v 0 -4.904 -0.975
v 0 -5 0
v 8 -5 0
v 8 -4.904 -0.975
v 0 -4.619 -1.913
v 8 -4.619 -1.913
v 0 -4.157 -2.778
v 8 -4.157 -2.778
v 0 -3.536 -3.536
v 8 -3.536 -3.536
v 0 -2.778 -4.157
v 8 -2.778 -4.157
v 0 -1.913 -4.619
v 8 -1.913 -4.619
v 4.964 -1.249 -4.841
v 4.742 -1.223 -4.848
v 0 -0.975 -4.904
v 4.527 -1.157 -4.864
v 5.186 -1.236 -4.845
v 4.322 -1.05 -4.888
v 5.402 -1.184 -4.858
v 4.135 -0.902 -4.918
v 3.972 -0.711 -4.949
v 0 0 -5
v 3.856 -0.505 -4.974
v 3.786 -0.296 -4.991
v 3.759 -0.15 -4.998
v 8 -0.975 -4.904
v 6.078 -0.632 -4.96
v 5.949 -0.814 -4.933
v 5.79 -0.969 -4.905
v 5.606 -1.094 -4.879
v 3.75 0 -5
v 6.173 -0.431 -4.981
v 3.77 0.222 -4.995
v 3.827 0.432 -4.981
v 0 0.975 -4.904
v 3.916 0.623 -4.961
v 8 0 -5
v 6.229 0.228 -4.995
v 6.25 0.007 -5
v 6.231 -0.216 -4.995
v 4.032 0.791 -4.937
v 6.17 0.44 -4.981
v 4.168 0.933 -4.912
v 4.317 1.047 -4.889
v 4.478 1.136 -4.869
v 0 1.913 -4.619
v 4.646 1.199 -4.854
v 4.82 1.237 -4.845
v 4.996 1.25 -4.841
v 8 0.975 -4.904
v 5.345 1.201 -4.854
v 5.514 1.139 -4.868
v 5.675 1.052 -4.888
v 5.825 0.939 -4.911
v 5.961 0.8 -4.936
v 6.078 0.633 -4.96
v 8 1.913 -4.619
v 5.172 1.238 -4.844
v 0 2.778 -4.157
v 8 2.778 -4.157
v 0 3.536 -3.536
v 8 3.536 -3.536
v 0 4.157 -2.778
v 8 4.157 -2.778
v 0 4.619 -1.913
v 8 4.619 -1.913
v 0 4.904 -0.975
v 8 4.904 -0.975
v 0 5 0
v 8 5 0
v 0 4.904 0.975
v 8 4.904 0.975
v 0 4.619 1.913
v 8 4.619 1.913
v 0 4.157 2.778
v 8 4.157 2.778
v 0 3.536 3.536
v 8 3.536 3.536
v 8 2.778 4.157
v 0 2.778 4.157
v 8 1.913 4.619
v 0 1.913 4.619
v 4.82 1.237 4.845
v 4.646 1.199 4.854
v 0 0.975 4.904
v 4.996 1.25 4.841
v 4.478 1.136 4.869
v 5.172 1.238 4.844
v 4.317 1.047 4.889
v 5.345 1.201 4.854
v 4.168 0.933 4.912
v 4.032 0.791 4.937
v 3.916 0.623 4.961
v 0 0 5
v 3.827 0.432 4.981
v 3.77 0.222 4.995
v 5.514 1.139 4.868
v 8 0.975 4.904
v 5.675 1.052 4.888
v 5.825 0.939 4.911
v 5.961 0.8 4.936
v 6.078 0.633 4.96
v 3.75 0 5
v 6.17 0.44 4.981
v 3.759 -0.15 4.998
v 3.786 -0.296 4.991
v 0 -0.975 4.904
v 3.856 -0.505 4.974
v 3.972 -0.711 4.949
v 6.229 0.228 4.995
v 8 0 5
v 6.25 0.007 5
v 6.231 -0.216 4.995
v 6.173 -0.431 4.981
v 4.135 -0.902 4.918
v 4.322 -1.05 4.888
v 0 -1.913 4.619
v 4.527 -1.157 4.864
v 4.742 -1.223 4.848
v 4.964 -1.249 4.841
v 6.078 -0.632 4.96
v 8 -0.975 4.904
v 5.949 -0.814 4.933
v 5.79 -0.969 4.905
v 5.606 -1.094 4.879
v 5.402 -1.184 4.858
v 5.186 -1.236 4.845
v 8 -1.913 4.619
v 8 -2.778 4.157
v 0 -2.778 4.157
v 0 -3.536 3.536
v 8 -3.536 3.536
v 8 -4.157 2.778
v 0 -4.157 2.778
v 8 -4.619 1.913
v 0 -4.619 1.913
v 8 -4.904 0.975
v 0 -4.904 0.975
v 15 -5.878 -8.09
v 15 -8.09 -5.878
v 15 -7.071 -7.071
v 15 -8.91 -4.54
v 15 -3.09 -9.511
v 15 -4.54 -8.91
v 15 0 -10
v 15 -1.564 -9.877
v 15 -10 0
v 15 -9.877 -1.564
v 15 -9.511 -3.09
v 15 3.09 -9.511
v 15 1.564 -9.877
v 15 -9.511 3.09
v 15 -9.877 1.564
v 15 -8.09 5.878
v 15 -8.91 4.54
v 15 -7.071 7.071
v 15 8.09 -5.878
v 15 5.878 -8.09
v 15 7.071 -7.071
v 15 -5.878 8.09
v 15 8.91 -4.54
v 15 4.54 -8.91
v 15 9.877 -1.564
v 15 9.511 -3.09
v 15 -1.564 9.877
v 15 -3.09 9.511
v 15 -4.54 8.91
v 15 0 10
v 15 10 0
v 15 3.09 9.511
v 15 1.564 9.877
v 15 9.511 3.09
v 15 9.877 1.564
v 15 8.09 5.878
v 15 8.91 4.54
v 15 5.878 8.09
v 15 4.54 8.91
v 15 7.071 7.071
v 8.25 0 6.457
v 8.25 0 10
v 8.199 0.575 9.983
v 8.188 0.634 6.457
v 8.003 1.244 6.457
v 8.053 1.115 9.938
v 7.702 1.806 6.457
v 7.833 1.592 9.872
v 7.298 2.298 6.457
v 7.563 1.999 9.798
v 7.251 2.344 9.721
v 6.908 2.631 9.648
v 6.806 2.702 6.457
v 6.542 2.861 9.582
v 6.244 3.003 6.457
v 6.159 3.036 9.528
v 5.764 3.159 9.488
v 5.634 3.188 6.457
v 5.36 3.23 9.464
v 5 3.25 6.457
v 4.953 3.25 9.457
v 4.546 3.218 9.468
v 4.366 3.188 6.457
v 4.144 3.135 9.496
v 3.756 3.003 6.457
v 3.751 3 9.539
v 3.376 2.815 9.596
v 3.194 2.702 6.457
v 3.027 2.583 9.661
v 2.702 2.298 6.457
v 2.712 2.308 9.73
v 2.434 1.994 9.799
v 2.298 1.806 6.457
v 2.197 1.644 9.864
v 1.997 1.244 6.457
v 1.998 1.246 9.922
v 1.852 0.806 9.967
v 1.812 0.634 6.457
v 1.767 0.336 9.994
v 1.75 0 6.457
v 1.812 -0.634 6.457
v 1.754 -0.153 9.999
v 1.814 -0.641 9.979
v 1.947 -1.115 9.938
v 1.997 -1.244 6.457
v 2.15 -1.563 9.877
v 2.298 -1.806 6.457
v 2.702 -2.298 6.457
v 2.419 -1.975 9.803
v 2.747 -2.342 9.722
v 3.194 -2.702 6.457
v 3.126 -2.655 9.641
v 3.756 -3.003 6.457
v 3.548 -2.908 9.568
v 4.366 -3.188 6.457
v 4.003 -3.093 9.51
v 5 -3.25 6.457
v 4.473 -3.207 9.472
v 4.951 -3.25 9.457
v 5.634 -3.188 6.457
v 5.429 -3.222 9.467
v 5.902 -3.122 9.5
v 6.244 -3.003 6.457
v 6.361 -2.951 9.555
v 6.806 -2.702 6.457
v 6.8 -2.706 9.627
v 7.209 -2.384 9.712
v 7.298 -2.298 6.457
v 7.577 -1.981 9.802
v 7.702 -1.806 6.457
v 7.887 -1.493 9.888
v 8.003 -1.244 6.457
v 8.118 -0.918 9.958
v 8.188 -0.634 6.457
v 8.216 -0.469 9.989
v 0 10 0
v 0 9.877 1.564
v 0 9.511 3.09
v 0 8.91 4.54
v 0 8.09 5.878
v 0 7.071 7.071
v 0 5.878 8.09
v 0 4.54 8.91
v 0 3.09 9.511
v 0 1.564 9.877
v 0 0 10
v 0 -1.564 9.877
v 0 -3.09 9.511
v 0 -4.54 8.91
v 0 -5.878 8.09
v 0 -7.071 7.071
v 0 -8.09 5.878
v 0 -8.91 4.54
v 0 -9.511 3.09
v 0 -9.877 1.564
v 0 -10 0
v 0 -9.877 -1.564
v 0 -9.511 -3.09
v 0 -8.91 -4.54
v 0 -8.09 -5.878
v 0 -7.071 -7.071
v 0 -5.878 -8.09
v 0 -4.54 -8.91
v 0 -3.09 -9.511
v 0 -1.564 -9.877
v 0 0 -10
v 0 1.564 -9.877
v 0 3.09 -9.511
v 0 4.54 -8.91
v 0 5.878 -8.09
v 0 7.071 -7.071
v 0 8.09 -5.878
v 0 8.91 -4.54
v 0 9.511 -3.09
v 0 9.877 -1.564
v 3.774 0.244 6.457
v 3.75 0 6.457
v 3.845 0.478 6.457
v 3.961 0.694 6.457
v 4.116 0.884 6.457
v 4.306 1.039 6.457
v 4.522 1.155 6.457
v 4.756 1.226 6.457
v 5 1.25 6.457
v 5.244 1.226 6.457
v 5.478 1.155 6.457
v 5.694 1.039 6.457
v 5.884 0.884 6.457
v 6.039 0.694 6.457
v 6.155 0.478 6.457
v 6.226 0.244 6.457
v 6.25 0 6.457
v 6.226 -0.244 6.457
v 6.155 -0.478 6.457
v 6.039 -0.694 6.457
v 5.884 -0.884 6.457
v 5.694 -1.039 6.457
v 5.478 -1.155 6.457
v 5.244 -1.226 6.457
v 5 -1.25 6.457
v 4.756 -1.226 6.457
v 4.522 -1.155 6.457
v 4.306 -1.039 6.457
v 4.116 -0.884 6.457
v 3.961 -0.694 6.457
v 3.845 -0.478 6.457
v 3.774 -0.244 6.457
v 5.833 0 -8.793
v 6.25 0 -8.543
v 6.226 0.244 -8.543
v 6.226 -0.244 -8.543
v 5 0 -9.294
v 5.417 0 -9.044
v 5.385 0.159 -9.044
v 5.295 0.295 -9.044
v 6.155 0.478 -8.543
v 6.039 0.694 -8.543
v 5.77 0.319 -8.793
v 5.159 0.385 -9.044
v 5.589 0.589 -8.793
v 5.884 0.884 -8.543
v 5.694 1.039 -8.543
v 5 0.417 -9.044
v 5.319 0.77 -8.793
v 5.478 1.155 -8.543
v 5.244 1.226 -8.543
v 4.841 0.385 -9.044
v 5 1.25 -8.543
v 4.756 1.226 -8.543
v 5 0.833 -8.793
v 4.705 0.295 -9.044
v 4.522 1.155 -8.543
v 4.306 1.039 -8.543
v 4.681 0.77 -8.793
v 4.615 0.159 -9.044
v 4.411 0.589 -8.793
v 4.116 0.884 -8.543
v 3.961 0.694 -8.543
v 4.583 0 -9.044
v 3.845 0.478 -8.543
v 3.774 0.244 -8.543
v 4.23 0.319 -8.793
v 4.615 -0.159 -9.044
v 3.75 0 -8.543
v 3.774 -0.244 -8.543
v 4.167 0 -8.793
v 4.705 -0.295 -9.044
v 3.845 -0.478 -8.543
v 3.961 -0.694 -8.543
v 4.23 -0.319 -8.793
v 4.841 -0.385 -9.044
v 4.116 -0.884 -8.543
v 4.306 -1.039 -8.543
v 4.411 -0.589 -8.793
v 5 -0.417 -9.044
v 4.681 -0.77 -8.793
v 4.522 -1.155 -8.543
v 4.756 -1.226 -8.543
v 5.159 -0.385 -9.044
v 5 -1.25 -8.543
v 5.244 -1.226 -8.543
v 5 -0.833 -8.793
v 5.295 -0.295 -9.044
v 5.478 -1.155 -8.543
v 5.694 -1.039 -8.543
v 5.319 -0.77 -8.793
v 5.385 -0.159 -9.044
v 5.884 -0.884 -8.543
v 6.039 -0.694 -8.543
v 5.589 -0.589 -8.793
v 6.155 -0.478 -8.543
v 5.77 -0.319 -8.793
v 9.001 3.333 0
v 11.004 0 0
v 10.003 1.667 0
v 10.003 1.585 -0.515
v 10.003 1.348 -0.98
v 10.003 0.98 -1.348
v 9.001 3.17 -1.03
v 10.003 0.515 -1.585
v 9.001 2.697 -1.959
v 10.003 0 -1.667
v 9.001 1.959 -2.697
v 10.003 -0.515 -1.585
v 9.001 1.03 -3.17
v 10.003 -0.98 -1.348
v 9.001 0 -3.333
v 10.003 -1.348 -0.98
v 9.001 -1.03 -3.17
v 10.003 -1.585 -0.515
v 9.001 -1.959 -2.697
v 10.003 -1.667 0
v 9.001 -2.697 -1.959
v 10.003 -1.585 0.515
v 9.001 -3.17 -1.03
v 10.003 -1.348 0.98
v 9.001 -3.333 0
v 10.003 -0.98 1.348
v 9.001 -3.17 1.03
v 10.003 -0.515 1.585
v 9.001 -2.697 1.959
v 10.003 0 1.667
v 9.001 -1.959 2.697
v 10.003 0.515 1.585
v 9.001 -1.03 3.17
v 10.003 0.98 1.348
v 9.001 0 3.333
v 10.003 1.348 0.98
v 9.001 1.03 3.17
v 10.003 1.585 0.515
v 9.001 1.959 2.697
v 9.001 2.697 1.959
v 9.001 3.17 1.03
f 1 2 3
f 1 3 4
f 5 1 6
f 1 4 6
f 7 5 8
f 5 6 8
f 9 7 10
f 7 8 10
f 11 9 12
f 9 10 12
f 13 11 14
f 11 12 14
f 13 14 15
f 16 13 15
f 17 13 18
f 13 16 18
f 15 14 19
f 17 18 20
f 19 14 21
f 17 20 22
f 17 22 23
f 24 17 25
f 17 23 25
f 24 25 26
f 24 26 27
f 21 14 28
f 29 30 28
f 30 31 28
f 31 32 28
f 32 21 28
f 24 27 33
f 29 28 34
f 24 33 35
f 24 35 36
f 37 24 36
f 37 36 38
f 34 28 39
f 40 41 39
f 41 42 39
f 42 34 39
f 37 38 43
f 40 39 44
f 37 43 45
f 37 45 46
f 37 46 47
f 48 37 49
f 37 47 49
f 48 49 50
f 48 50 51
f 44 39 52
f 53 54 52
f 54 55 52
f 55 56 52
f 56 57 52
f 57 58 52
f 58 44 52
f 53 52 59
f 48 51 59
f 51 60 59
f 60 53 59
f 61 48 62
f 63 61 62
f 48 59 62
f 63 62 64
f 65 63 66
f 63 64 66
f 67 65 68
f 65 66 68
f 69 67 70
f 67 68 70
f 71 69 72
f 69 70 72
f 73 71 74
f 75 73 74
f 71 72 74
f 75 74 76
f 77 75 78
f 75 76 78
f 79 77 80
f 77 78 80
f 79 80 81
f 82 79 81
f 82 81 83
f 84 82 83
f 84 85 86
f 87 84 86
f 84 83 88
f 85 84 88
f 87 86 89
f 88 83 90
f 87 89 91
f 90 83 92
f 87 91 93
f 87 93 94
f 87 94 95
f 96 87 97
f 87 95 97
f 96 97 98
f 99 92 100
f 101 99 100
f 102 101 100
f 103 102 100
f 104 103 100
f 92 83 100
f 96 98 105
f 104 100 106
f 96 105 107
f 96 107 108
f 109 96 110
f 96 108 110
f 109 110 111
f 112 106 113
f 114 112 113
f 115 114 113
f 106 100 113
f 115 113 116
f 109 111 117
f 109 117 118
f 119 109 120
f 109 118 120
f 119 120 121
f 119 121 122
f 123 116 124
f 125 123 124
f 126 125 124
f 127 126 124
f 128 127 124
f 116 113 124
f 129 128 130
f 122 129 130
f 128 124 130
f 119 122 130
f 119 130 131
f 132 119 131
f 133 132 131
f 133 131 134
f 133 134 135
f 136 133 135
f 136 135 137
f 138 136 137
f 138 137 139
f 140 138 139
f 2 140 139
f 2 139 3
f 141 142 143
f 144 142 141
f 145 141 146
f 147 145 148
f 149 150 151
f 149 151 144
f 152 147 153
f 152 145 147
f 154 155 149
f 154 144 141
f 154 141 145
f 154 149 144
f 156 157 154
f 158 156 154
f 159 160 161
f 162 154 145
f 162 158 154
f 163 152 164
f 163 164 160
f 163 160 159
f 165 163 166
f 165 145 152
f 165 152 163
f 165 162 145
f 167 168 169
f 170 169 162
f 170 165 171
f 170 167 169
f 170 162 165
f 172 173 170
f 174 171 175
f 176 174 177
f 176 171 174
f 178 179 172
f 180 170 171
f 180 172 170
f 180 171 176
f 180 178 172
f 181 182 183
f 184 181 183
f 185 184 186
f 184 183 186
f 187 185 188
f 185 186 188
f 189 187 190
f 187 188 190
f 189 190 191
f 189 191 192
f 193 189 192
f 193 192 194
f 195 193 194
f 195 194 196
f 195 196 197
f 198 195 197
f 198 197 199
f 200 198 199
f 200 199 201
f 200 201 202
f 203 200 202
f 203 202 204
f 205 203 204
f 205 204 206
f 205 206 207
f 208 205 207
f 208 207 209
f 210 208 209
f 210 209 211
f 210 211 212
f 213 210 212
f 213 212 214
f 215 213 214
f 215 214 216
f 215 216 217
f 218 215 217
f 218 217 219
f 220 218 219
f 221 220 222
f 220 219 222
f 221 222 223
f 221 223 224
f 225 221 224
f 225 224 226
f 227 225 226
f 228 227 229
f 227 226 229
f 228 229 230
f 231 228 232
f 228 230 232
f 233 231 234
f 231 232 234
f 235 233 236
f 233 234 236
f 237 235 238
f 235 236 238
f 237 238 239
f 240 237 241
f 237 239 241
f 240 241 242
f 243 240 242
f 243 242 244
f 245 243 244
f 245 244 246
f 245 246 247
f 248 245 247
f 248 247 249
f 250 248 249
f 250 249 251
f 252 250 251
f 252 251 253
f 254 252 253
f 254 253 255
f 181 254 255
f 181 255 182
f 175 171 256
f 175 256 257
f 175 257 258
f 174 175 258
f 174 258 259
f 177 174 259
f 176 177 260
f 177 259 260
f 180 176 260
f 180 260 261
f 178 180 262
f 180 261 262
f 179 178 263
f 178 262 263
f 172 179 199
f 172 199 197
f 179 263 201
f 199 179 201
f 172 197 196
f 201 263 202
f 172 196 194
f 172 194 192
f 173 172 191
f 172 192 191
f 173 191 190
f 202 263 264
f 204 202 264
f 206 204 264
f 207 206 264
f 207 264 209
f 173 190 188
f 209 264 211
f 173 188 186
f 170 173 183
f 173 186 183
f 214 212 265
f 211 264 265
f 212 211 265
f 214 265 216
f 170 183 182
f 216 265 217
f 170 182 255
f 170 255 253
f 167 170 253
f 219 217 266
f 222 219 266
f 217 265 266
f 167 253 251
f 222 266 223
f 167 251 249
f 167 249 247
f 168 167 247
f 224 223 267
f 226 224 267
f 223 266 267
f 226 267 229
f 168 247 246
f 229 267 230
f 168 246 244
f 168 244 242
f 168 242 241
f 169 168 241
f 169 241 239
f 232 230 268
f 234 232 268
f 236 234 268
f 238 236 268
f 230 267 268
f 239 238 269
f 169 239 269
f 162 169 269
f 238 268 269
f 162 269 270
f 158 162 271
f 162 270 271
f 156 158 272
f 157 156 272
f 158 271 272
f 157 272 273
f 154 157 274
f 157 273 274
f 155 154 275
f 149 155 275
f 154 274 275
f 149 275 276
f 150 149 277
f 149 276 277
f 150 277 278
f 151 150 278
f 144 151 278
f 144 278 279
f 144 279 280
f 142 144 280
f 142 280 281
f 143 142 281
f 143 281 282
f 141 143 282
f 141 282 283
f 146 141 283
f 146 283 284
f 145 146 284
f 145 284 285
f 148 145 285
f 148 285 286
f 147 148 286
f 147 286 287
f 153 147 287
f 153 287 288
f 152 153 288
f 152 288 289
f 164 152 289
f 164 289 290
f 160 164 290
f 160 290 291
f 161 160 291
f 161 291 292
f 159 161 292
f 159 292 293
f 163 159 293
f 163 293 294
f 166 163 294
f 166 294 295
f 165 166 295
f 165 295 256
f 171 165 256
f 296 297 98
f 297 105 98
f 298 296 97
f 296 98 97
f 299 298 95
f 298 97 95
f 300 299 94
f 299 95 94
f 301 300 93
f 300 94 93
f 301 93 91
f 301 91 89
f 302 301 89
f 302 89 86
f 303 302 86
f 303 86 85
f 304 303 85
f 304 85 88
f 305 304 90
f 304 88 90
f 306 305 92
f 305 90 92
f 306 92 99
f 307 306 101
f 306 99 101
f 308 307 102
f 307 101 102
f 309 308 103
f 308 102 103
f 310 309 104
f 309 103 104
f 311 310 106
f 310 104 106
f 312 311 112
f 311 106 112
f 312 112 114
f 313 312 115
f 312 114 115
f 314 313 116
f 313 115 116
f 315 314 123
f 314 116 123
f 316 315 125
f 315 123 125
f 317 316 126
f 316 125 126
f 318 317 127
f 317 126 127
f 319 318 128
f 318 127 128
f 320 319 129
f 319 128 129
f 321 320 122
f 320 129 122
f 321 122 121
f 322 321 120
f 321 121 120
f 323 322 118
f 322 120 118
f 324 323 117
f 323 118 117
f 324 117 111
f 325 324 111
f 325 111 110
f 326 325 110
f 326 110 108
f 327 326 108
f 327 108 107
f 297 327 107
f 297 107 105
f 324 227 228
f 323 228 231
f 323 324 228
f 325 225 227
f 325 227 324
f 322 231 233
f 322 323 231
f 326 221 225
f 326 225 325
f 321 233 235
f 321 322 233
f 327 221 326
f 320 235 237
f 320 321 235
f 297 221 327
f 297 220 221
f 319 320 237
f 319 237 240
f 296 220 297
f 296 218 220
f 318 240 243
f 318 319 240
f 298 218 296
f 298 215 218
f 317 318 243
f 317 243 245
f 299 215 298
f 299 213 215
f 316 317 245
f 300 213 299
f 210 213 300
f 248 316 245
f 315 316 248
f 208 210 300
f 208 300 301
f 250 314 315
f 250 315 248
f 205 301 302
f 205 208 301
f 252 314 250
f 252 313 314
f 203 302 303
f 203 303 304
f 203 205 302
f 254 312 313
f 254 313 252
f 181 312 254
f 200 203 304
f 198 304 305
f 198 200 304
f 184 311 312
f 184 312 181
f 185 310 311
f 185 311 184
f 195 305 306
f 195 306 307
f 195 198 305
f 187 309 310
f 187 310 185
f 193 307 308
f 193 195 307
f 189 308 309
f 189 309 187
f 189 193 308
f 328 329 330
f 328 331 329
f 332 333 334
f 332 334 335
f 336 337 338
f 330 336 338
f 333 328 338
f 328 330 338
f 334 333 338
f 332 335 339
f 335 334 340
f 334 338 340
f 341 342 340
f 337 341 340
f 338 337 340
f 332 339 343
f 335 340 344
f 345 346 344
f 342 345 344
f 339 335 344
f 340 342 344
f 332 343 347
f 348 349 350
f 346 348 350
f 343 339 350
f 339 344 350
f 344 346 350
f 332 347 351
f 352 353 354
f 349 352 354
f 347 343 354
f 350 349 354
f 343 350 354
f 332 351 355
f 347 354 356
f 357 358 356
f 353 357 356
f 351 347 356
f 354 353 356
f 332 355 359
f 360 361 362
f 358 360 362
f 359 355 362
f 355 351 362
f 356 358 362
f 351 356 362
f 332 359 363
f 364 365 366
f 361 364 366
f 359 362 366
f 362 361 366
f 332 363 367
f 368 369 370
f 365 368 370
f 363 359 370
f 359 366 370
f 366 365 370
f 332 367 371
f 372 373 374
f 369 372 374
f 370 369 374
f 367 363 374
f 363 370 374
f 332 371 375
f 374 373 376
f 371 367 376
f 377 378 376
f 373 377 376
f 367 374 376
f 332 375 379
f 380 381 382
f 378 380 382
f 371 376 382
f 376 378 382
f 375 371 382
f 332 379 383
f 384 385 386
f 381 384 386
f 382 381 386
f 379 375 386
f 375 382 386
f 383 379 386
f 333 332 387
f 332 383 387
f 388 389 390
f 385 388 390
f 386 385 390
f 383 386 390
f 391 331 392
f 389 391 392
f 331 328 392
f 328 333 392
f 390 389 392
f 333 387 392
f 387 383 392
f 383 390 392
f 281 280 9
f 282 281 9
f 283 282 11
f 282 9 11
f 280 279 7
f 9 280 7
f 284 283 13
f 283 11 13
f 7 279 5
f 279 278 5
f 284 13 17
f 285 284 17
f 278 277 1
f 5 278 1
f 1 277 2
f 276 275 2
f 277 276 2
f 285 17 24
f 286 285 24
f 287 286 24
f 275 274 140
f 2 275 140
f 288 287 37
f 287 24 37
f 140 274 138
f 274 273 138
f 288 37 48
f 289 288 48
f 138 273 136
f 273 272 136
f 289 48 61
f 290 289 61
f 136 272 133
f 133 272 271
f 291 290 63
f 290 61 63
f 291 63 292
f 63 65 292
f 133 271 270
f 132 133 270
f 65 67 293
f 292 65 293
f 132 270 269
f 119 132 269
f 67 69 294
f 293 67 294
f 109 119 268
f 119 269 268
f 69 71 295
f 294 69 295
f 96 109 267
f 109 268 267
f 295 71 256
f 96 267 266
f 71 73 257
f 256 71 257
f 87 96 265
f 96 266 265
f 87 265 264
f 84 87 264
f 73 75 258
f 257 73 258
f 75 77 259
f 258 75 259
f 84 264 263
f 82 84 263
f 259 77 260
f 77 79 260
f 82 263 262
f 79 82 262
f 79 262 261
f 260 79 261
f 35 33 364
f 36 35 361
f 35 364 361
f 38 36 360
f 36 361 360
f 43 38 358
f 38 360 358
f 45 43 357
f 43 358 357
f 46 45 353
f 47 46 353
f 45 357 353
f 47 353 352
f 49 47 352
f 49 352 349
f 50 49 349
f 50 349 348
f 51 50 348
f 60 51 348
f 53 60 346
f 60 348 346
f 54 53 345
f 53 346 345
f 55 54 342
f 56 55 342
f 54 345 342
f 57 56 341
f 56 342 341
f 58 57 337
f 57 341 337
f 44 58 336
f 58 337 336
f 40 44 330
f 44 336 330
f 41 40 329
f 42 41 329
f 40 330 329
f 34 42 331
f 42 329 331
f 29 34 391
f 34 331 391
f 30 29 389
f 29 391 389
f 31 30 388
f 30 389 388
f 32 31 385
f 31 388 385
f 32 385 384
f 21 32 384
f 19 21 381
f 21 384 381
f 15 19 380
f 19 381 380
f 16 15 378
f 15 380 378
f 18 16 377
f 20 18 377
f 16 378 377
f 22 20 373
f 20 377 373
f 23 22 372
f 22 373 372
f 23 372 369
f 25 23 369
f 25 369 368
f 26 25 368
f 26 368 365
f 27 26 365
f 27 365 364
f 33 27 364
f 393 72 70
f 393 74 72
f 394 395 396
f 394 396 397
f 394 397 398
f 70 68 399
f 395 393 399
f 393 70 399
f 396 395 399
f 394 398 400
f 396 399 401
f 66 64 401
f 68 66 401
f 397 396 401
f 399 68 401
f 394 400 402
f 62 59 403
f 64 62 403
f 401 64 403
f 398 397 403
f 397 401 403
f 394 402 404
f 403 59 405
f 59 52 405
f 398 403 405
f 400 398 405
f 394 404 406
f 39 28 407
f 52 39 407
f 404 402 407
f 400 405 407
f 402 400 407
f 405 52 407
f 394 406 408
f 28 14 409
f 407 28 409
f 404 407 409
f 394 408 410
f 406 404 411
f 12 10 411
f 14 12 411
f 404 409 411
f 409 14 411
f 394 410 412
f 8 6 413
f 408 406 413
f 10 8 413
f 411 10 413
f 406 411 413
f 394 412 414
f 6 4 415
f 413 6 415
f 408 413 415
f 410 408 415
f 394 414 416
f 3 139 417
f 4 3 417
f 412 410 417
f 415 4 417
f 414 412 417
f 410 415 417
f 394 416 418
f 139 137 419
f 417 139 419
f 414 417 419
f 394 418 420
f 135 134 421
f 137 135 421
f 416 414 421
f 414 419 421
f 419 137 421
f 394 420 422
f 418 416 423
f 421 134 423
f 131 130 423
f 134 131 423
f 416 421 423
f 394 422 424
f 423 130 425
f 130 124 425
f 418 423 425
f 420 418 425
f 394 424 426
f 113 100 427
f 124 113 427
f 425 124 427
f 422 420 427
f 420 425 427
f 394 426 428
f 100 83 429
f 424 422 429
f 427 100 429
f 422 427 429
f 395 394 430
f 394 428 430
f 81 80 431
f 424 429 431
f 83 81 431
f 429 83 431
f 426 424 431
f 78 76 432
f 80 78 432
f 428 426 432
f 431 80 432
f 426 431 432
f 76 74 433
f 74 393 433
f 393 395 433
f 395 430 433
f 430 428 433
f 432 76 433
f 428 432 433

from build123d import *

# Parameters (mm, degrees)
F0_R           = 10
F1_DEPTH       = 15
F2_D           = 10
F2_DEPTH       = 8
F2_TIP         = 3.0043030951
F6_D           = 2.5
F6_DEPTH       = 18
F6_START       = 0.5428599
F6_CBORE_D     = 6.5
F6_CBORE_DEPTH = 3
F6_TIP         = 0.7510757738


with BuildPart() as f1:
    # F0 (on Right) → F1 (new body)
    with BuildSketch(Plane.YZ):
        Circle(F0_R)
    extrude(amount=F1_DEPTH)

    # F2
    with Locations(Plane(origin=(0, 0, 0), x_dir=(0, 1, 0), z_dir=(-1, 0, 0))):
        with Locations((0, 0)):
            Hole(F2_D / 2, depth=F2_DEPTH)
            with Locations((0, 0, -(F2_DEPTH + F2_TIP / 2))):  # 118° drill point
                Cone(0, F2_D / 2, F2_TIP, mode=Mode.SUBTRACT)

    # F6
    # its depths count from where the whole tool has entered the part; down to there all is cleared
    with Locations(Plane.XY.offset(10).offset(-F6_START)):
        with Locations((5, 0)):
            CounterBoreHole(F6_D / 2, F6_CBORE_D / 2, F6_CBORE_DEPTH, depth=F6_DEPTH)
            with Locations((0, 0, -(F6_DEPTH + F6_TIP / 2))):  # 118° drill point
                Cone(0, F6_D / 2, F6_TIP, mode=Mode.SUBTRACT)


solid = f1.part
